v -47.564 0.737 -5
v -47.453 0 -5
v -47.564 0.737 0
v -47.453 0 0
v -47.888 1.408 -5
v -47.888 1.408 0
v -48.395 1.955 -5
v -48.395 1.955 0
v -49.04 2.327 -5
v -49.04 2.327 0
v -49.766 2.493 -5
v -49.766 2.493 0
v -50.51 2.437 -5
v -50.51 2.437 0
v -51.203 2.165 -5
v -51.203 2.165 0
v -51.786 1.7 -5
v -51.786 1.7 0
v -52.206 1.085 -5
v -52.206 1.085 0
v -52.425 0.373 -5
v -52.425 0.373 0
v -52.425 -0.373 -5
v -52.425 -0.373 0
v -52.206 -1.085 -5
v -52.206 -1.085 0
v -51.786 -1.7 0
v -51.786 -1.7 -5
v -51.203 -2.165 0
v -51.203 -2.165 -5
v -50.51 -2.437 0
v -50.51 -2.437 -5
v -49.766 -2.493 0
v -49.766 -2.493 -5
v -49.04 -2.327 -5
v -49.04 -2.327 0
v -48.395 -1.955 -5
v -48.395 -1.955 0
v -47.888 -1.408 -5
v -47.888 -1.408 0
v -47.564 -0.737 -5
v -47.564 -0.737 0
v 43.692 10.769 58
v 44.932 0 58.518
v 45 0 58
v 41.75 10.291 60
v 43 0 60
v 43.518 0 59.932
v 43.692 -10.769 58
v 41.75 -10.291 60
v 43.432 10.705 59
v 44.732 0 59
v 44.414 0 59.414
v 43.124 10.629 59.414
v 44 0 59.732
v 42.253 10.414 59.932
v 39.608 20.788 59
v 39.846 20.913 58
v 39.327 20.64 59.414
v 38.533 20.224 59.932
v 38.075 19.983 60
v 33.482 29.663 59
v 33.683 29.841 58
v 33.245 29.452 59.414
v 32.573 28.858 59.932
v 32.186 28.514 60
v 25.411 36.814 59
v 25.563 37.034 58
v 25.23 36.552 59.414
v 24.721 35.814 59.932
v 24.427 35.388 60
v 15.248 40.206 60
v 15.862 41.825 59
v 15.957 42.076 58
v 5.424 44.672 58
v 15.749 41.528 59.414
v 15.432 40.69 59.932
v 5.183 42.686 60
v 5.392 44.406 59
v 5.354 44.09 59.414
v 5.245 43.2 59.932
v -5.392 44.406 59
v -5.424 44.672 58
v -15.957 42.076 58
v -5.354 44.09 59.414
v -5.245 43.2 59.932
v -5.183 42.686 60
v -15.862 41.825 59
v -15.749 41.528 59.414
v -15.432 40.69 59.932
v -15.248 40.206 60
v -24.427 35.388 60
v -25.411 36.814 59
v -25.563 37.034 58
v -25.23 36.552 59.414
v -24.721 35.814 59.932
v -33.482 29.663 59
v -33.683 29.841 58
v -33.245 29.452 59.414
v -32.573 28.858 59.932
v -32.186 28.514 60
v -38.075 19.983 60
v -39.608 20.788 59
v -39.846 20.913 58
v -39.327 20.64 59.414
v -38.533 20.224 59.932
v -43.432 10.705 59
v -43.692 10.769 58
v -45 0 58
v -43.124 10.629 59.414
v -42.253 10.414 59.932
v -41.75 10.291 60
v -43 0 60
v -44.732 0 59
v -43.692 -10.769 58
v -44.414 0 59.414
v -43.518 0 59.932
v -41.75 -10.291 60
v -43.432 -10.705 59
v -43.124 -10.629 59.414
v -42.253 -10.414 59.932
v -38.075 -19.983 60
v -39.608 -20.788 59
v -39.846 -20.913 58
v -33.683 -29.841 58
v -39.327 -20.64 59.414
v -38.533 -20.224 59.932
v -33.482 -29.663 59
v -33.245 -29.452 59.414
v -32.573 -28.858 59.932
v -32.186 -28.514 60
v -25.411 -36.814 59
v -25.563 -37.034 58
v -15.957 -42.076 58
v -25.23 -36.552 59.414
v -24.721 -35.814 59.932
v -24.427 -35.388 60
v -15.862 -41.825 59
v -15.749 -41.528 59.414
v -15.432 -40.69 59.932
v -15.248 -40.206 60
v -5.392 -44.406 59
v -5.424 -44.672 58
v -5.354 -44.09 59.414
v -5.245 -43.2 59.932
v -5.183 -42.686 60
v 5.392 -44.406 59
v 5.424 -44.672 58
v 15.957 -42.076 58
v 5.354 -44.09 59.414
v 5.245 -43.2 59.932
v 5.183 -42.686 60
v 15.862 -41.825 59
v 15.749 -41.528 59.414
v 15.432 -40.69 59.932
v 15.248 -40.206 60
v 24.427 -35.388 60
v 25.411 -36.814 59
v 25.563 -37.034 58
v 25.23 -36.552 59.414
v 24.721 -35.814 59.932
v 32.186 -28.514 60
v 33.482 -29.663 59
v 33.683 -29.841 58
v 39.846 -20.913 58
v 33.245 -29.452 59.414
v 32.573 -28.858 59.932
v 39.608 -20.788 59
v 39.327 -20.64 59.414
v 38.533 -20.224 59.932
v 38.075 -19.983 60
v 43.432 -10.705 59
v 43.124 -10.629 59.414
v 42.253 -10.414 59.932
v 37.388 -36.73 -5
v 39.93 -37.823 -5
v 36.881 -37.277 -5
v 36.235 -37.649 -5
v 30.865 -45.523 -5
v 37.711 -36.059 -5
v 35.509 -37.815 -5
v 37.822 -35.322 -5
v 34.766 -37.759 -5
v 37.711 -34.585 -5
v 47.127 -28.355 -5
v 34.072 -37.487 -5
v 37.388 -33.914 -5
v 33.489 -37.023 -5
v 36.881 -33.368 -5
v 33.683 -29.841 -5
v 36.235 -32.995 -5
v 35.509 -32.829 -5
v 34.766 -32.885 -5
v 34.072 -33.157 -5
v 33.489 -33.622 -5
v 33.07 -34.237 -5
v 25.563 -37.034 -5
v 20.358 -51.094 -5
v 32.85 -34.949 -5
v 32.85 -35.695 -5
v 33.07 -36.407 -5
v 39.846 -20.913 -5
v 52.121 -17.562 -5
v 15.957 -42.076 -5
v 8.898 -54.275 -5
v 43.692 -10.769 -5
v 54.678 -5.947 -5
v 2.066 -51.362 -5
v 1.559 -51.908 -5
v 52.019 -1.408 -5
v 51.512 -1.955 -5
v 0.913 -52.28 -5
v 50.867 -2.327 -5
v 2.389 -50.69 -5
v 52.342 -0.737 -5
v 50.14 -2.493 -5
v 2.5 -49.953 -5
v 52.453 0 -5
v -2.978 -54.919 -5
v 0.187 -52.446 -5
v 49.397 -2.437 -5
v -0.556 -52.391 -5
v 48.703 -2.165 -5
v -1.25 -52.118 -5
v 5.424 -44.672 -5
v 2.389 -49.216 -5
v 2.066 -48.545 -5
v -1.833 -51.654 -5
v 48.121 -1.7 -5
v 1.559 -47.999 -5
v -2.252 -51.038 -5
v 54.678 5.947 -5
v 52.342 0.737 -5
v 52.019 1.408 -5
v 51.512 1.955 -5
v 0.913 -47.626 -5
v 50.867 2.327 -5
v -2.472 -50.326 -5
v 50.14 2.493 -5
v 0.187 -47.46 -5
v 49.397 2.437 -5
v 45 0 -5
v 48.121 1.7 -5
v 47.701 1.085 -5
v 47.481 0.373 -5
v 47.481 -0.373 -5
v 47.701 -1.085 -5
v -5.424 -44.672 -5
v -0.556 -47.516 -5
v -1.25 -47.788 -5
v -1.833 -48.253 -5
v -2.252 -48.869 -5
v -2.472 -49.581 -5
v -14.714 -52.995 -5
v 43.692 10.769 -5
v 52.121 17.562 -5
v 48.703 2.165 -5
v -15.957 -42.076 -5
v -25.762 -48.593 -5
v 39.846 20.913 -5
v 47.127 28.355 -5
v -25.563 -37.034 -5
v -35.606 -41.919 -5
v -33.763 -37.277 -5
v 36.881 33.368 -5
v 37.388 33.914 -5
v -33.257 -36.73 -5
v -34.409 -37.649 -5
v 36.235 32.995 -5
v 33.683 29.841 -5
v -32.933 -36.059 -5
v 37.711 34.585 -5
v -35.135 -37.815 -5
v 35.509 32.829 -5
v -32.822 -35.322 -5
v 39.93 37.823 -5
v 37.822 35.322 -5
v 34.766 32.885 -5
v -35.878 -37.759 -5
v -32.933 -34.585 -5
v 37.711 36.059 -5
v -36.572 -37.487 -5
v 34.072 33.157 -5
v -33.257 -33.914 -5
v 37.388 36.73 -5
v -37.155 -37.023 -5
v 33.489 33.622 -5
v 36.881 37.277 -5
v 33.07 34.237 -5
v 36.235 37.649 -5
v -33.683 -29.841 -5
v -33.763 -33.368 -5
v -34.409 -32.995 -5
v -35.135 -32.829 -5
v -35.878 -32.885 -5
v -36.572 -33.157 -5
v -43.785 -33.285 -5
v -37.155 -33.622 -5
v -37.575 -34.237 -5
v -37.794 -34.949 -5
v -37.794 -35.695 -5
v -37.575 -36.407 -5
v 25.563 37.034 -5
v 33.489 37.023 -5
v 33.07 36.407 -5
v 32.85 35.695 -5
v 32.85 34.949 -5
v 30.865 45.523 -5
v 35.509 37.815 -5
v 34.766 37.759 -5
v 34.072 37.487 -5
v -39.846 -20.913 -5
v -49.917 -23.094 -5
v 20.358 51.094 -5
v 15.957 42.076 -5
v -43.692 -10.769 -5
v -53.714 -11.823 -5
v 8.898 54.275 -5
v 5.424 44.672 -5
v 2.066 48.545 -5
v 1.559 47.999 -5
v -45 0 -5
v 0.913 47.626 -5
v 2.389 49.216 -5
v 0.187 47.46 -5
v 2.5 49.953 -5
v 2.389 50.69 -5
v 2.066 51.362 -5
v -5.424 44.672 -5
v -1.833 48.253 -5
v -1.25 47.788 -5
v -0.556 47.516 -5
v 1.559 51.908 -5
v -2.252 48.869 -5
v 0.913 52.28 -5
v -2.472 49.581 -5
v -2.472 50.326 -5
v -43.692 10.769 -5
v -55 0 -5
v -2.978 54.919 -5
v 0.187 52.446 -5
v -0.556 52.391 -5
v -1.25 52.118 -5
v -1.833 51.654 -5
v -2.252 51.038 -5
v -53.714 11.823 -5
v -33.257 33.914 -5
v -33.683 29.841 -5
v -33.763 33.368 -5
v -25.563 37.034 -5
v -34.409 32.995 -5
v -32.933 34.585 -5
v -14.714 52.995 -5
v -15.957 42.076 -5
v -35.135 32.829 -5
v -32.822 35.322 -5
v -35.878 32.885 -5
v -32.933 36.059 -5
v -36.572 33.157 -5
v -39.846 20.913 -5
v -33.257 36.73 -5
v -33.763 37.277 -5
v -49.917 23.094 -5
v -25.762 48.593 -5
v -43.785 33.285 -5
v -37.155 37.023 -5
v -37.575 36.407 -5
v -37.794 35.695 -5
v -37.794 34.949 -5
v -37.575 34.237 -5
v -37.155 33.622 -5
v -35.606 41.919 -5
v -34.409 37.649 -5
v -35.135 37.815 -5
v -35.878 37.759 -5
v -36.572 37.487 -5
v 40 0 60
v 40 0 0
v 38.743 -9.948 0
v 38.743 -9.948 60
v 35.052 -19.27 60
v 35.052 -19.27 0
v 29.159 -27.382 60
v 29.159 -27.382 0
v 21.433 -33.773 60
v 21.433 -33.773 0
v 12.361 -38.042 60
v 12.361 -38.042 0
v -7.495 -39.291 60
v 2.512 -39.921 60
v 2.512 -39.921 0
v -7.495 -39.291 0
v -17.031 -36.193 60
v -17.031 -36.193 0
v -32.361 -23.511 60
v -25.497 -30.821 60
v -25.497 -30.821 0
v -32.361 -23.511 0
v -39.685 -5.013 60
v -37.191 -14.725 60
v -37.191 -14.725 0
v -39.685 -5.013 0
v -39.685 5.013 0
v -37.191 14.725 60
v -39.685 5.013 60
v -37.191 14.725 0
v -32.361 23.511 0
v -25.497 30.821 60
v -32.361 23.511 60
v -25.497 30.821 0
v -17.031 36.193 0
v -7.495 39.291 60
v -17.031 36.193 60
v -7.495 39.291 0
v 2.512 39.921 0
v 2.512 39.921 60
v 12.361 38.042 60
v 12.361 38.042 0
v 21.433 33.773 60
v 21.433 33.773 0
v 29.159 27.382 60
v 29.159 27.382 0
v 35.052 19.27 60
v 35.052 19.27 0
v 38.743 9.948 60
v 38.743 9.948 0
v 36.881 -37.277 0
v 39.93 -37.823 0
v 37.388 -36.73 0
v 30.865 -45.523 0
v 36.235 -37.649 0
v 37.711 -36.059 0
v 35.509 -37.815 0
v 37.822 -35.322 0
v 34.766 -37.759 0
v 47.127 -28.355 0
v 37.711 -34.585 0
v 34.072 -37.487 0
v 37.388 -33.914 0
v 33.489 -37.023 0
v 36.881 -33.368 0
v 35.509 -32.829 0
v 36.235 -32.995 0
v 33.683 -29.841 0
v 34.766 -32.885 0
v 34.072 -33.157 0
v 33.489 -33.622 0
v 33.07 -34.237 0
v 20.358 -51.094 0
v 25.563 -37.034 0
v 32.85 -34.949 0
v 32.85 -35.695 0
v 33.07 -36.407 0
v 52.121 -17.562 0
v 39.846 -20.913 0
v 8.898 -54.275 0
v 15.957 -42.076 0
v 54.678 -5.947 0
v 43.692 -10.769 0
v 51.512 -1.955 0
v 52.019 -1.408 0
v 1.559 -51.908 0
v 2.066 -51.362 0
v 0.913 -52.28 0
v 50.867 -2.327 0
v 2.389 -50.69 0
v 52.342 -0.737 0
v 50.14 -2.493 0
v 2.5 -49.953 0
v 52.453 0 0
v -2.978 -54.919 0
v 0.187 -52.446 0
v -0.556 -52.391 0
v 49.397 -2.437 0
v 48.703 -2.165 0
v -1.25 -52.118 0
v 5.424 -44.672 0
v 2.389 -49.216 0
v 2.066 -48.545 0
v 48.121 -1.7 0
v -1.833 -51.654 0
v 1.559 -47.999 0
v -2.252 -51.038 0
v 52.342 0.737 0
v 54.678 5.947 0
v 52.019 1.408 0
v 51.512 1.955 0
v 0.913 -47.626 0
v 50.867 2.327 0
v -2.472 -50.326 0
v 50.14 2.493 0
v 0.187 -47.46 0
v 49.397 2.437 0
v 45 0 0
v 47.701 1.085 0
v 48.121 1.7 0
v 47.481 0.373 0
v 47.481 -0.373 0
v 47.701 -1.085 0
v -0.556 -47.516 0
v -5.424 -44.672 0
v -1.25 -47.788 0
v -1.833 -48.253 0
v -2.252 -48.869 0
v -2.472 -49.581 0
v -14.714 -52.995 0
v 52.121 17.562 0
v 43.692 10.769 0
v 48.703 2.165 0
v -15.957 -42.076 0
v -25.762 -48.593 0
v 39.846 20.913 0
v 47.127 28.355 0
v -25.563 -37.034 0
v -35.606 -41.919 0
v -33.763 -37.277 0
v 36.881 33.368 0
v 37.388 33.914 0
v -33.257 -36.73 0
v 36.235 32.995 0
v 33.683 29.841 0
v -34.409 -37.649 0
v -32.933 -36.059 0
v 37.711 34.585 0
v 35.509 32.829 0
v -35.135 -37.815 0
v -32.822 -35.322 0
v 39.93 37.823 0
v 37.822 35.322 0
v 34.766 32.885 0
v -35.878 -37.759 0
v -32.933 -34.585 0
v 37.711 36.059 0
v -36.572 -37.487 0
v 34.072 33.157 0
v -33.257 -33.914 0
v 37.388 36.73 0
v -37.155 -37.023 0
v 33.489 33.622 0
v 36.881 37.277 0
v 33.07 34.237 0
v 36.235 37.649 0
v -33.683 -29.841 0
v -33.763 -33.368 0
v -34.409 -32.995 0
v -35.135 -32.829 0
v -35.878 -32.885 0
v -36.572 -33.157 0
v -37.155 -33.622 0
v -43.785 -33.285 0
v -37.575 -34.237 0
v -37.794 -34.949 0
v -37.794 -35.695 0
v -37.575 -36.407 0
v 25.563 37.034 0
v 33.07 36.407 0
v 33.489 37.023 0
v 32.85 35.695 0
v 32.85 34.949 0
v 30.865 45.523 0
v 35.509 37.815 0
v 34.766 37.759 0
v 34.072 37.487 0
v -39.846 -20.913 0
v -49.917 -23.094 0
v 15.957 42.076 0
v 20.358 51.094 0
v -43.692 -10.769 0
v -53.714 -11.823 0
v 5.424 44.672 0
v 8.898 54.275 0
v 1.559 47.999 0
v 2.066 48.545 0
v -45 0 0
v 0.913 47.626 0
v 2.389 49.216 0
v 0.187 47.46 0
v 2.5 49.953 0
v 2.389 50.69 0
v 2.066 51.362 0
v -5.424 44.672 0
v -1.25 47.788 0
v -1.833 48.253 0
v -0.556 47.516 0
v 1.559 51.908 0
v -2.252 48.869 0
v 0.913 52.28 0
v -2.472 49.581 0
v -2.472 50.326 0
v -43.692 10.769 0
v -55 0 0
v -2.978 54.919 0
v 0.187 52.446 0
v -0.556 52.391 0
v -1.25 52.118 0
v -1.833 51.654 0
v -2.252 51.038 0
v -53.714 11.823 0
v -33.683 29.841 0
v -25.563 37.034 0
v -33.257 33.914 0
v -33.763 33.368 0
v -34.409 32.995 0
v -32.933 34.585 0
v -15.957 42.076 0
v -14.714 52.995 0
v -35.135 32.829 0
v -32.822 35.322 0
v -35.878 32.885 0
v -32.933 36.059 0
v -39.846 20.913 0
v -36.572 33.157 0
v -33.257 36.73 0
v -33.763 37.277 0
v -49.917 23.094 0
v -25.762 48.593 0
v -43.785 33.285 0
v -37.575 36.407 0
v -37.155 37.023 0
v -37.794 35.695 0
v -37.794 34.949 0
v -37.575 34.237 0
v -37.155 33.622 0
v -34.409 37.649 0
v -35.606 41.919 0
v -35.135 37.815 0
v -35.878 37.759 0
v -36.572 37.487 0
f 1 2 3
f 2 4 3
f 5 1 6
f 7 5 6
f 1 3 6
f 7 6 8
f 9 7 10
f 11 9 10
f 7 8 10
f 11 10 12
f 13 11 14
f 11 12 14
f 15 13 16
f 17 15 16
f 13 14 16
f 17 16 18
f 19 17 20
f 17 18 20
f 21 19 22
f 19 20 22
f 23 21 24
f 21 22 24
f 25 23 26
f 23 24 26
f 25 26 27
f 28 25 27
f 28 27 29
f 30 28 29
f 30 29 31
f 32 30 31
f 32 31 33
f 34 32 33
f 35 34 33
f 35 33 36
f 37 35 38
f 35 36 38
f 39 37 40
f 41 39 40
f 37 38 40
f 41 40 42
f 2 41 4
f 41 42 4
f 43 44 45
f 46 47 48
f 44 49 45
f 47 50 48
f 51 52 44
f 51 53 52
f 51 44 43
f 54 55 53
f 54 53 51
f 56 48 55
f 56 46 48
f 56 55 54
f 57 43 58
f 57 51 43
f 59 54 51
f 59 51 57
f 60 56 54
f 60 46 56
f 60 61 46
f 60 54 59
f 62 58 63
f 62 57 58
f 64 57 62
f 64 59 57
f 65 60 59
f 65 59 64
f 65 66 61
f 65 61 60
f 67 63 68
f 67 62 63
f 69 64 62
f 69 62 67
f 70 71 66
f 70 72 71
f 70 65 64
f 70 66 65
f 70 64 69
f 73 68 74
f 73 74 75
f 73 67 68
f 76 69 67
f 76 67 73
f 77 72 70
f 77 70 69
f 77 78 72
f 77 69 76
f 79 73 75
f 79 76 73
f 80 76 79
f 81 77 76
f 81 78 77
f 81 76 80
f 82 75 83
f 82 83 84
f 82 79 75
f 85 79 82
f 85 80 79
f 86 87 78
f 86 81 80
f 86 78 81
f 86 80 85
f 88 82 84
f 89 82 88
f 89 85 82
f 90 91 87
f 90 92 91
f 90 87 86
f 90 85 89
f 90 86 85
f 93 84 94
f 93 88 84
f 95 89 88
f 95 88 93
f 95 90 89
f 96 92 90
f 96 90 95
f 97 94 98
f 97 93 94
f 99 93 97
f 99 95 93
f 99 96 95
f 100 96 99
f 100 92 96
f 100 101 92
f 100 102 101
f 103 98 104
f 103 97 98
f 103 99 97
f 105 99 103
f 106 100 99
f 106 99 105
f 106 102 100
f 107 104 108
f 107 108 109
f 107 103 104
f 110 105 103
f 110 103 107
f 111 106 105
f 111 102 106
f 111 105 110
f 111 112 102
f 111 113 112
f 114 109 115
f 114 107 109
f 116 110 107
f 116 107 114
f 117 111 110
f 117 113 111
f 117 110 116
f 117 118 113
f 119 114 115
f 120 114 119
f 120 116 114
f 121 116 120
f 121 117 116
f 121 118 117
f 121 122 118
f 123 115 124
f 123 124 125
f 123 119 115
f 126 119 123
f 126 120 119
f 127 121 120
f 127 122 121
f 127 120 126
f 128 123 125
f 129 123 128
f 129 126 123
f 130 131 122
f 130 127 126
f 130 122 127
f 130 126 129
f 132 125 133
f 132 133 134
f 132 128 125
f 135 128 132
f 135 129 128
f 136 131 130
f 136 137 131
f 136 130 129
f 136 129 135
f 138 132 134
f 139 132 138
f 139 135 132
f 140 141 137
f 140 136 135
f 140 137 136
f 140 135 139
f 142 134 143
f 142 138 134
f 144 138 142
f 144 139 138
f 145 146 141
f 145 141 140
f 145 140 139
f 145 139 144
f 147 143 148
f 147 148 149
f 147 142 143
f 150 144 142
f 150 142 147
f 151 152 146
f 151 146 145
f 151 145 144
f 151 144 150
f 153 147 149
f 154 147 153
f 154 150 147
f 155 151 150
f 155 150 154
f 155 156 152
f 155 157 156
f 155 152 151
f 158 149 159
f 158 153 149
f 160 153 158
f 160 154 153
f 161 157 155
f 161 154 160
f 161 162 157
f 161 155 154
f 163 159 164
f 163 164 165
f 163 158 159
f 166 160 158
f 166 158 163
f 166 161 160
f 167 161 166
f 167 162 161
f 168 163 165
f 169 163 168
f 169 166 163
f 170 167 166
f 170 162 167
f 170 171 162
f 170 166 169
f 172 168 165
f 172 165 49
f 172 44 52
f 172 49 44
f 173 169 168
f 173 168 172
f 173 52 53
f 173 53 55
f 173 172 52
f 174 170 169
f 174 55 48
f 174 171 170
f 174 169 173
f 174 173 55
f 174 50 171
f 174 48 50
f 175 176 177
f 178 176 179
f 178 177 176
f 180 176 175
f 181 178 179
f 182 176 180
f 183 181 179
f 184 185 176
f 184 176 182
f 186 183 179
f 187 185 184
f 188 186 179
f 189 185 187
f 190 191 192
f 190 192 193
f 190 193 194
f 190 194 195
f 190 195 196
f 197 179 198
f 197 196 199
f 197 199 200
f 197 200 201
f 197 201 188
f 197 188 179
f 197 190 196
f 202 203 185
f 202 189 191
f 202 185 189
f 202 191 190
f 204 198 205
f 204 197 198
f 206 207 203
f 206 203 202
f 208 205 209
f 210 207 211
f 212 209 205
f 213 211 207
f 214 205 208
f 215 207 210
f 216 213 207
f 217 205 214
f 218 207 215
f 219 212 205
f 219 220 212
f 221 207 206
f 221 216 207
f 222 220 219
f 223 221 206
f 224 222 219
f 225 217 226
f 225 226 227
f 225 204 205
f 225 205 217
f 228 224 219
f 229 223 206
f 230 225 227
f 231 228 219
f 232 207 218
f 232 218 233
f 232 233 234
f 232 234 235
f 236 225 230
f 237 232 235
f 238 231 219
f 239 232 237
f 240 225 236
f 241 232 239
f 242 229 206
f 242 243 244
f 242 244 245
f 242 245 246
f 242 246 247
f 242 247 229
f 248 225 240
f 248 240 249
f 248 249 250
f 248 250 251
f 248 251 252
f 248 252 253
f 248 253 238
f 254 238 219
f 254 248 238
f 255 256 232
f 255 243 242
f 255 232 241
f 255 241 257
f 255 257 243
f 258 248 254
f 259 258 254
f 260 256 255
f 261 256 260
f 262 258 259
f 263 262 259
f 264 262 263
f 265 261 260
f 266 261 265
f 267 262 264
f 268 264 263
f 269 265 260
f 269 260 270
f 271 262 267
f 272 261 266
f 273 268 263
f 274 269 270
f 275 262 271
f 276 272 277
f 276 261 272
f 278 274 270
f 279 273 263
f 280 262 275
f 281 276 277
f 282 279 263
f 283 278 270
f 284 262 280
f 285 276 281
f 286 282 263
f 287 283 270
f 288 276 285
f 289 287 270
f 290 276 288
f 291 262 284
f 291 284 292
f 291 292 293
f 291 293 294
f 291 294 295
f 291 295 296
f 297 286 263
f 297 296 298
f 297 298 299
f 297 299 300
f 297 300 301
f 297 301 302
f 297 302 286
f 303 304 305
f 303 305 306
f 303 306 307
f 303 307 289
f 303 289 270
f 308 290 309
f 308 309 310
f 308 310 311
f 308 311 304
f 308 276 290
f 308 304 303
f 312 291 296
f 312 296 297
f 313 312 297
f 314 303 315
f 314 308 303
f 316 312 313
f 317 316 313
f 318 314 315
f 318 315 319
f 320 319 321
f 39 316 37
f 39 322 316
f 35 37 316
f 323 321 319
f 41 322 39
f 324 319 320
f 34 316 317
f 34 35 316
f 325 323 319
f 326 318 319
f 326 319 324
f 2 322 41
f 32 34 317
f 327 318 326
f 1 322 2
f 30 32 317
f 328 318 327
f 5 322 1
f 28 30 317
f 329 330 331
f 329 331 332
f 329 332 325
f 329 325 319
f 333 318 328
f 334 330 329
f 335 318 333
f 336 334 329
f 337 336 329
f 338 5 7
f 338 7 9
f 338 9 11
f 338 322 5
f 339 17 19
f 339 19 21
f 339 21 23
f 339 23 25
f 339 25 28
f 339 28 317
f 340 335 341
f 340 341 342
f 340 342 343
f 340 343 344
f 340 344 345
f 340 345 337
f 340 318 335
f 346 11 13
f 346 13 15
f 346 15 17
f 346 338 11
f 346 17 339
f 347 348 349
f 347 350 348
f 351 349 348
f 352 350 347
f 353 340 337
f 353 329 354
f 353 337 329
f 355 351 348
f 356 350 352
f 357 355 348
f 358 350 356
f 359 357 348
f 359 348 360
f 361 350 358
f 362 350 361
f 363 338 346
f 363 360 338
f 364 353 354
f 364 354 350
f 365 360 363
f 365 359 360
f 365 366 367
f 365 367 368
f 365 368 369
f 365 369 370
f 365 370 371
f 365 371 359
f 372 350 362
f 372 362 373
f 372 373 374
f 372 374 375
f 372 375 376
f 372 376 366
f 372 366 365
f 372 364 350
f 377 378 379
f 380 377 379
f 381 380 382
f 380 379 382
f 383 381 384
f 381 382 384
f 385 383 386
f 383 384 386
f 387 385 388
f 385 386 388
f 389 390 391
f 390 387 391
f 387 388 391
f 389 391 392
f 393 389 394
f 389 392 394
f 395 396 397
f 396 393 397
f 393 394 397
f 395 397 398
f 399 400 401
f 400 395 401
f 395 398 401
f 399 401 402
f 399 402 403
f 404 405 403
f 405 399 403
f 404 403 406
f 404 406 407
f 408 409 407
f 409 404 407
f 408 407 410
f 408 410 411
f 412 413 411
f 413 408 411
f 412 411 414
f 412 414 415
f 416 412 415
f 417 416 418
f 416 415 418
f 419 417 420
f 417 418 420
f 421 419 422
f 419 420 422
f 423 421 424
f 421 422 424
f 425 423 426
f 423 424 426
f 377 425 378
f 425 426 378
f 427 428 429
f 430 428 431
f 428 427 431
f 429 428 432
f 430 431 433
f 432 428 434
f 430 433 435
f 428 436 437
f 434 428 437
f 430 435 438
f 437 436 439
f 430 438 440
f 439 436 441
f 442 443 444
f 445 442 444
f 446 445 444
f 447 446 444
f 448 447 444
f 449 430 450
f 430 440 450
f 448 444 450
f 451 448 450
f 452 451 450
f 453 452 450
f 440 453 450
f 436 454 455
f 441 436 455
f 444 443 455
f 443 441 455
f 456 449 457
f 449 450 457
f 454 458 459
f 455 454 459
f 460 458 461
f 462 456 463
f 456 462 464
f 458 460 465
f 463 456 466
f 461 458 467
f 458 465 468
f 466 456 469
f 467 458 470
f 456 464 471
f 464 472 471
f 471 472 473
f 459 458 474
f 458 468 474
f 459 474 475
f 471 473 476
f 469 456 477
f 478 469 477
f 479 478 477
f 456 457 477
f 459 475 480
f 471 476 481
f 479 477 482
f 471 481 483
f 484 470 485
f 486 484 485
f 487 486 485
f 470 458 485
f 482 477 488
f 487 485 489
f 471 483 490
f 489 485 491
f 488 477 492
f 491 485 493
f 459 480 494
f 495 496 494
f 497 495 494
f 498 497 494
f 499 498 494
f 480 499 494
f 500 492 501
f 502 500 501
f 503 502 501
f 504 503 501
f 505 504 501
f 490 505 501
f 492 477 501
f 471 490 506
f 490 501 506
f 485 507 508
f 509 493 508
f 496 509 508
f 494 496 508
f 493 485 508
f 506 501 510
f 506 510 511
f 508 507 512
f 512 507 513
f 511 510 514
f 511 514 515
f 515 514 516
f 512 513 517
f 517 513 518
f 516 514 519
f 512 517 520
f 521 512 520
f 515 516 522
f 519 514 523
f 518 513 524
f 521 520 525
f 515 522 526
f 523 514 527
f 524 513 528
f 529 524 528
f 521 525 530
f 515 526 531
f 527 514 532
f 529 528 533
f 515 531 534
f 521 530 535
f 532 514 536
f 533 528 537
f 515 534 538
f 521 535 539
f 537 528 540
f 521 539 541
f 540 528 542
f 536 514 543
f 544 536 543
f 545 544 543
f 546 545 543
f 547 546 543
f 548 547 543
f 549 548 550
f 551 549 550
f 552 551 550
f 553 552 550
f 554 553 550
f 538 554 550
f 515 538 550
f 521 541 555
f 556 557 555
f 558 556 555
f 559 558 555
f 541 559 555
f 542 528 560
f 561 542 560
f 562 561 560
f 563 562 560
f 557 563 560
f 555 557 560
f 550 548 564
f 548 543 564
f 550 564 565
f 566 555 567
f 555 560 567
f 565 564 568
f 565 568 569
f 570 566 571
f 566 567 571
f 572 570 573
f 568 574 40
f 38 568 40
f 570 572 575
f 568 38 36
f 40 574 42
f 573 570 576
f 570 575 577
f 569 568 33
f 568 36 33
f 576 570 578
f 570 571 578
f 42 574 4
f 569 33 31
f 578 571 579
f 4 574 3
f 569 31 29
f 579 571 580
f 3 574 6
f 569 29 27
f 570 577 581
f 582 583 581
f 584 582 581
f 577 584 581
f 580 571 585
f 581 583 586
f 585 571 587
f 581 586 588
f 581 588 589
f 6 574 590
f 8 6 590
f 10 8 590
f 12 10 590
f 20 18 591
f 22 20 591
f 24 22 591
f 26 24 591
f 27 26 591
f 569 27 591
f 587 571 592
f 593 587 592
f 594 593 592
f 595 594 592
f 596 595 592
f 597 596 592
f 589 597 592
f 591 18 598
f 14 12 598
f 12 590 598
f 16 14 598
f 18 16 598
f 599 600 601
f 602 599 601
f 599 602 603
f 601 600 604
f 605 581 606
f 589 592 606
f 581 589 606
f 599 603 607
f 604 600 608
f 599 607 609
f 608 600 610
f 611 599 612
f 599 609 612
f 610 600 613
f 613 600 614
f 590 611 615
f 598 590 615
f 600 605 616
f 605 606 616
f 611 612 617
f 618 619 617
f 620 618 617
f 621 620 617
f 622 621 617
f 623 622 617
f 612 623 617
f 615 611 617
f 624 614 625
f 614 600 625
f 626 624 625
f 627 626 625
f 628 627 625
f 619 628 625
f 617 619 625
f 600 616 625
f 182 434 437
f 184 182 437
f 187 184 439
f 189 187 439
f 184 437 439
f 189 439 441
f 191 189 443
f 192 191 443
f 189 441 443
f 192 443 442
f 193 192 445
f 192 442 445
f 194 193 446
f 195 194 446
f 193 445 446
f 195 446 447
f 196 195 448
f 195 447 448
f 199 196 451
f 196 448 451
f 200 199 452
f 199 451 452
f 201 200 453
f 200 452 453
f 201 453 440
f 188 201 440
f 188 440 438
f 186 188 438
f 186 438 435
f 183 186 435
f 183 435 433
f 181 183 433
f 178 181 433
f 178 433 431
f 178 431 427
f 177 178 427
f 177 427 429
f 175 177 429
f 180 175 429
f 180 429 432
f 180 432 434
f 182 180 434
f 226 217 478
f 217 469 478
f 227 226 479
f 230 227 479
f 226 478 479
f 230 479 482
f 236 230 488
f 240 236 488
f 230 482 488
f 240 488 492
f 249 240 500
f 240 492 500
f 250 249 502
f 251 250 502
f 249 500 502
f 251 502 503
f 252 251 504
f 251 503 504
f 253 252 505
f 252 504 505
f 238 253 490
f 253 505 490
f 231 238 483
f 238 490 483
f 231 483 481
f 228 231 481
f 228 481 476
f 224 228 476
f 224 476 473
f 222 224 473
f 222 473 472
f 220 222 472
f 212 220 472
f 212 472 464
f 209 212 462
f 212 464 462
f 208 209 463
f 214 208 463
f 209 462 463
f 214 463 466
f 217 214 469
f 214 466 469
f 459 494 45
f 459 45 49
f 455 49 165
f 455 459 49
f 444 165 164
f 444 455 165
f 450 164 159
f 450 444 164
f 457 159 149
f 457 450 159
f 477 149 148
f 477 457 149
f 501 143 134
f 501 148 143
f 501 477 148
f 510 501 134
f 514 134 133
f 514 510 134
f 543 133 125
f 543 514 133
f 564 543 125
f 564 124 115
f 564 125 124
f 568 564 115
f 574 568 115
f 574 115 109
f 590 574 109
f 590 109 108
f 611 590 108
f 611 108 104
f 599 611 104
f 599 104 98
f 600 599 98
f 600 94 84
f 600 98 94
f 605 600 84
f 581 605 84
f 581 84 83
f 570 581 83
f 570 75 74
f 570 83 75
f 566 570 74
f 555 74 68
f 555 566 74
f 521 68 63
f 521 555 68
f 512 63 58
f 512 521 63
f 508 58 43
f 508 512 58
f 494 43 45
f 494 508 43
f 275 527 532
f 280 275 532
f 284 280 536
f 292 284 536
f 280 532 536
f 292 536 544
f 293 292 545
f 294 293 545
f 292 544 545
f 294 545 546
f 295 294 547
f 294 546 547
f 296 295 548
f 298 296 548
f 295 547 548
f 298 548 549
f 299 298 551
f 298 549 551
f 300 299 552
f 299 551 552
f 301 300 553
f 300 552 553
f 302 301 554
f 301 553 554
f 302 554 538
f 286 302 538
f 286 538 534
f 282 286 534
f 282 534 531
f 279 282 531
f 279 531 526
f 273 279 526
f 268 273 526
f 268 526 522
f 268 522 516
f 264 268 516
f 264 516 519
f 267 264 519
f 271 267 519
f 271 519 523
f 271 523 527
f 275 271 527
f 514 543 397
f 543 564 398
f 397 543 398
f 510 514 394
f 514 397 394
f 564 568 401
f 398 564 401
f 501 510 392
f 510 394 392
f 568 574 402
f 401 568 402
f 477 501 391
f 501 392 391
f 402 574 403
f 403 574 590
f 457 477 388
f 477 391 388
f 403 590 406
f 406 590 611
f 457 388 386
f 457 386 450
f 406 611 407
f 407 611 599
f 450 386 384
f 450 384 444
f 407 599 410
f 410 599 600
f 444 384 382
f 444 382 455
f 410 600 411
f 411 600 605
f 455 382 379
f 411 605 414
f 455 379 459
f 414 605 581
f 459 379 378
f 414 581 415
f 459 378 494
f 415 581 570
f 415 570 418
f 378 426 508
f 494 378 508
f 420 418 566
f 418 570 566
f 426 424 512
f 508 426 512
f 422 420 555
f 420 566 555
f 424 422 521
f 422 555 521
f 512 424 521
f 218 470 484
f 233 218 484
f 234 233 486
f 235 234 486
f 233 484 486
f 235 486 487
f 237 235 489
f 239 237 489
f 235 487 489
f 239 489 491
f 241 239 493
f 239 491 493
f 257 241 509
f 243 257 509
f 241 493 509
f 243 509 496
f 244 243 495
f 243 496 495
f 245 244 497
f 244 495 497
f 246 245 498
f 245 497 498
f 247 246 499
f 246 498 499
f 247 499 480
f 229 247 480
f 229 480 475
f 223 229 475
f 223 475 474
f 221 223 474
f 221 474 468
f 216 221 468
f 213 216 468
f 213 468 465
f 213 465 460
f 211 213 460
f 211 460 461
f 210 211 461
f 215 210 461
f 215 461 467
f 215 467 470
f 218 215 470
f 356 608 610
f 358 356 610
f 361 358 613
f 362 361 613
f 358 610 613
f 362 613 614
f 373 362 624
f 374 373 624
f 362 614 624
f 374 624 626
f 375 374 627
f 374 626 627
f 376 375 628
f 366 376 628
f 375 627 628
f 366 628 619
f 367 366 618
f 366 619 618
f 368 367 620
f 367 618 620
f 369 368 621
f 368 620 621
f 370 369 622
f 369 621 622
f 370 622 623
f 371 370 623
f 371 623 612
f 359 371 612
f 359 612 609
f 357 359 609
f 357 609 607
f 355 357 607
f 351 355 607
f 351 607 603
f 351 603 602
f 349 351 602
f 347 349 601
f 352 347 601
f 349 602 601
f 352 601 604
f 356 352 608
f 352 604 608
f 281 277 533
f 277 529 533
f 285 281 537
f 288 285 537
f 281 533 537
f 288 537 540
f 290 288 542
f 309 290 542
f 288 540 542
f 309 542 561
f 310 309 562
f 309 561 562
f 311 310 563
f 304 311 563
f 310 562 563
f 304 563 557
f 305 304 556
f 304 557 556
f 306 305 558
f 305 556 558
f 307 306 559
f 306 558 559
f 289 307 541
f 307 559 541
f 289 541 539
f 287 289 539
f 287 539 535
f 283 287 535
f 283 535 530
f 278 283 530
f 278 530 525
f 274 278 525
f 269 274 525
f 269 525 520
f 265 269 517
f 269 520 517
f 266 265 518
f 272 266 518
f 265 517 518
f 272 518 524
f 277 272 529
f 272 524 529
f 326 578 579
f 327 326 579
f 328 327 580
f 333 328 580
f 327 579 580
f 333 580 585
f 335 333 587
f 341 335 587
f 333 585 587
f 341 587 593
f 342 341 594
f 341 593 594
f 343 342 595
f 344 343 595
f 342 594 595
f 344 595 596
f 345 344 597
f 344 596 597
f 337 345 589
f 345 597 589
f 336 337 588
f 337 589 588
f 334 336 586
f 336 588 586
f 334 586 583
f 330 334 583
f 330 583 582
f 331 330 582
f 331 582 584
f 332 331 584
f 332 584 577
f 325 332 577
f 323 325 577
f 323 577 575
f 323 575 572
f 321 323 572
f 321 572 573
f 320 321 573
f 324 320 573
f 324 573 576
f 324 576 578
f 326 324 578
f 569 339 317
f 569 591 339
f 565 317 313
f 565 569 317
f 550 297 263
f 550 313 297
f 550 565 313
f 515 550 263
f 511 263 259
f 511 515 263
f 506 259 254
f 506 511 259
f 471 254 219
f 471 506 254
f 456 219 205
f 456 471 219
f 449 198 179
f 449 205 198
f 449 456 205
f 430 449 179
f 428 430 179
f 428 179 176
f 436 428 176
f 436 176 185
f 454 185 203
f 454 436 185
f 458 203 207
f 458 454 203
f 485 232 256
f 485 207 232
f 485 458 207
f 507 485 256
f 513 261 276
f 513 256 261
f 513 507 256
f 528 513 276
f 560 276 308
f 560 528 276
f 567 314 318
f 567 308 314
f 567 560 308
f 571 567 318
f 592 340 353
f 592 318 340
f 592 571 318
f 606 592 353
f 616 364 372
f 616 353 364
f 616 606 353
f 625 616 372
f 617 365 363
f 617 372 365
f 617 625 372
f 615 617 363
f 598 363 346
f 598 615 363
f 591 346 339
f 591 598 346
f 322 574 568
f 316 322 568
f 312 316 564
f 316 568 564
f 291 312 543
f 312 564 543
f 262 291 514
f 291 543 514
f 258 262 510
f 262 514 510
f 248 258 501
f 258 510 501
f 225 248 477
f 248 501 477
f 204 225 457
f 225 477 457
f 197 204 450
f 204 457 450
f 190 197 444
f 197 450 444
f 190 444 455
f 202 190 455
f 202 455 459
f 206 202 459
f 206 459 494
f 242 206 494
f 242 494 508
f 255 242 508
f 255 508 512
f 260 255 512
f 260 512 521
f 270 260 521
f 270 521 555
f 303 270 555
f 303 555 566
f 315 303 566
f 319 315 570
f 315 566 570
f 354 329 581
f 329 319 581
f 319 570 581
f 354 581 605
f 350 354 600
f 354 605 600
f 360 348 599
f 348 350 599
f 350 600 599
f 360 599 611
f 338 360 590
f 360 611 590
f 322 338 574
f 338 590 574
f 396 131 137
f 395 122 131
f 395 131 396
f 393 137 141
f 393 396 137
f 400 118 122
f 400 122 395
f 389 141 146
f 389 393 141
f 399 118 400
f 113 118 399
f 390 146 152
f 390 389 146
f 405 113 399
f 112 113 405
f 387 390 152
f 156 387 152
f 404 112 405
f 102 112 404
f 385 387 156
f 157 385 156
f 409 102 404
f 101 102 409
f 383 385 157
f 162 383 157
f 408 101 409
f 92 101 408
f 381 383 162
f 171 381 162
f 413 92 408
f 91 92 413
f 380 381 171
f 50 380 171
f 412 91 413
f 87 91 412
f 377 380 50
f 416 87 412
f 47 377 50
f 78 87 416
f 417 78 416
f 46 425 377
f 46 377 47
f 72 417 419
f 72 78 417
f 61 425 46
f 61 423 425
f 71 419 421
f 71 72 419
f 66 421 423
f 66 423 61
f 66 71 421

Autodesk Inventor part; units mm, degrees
ref_plane "YZ Plane" through (0, 0, 0) normal (1, 0, 0) x (0, 1, 0)
ref_plane "XZ Plane" through (0, 0, 0) normal (0, 1, 0) x (-1, 0, 0)
ref_plane "XY Plane" through (0, 0, 0) normal (0, 0, 1) x (1, 0, 0)
sketch "Sketch1" plane through (0, 0, 0) normal (0, 0, 1) x (1, 0, 0)
  circle A0 centre (0, 0) radius 40
  circle A1 centre (0, 0) radius 45
  dimension "d0" = 80
  dimension "d1" = 5
extrude "Extrusion1" add sketch "Sketch1" along normal blind 60
fillet "Fillet1" radius 2 1 edges at (-45, 0, 60)
sketch "Sketch2" plane through (0, 0, 0) normal (0, 0, -1) x (-1, 0, 0)
  circle A0 centre (0, 0) radius 45 projected
  circle A1 centre (0, 0) radius 55
  dimension "d5" = 10
extrude "Extrusion2" add sketch "Sketch2" along normal blind 5
sketch "Sketch3" plane through (0, 0, 0) normal (0, 0, 1) x (1, 0, 0)
  circle A0 centre (0, -49.9533) radius 2.5
  circle A1 centre (0, 0) radius 45 projected
  circle A2 centre (49.9533, 0) radius 2.5
  circle A3 centre (0, 49.9533) radius 2.5
  circle A4 centre (-49.9533, 0) radius 2.5
  dimension "d8" = 5
  dimension "d11" = 360
extrude "Extrusion3" cut sketch "Sketch3" against normal through all contours A0 | A2 | A3 | A4
sketch "Sketch4" plane through (0, 0, 0) normal (0, 0, 1) x (1, 0, 0)
  line L0 (0, 0) -> (49.953, 0) construction
  circle A0 centre (35.3221, 35.3221) radius 2.5
  circle A1 centre (35.3221, -35.3221) radius 2.5
  circle A2 centre (-35.3221, -35.3221) radius 2.5
  circle A3 centre (-35.3221, 35.3221) radius 2.5
  dimension "d20" = 360
extrude "Extrusion4" cut sketch "Sketch4" against normal through all
sketch "Sketch5" plane through (0, 0, 60) normal (0, 0, 1) x (1, 0, 0)
  point P0 (0, 0)
properties part number "base" material "Aluminum 6061"
